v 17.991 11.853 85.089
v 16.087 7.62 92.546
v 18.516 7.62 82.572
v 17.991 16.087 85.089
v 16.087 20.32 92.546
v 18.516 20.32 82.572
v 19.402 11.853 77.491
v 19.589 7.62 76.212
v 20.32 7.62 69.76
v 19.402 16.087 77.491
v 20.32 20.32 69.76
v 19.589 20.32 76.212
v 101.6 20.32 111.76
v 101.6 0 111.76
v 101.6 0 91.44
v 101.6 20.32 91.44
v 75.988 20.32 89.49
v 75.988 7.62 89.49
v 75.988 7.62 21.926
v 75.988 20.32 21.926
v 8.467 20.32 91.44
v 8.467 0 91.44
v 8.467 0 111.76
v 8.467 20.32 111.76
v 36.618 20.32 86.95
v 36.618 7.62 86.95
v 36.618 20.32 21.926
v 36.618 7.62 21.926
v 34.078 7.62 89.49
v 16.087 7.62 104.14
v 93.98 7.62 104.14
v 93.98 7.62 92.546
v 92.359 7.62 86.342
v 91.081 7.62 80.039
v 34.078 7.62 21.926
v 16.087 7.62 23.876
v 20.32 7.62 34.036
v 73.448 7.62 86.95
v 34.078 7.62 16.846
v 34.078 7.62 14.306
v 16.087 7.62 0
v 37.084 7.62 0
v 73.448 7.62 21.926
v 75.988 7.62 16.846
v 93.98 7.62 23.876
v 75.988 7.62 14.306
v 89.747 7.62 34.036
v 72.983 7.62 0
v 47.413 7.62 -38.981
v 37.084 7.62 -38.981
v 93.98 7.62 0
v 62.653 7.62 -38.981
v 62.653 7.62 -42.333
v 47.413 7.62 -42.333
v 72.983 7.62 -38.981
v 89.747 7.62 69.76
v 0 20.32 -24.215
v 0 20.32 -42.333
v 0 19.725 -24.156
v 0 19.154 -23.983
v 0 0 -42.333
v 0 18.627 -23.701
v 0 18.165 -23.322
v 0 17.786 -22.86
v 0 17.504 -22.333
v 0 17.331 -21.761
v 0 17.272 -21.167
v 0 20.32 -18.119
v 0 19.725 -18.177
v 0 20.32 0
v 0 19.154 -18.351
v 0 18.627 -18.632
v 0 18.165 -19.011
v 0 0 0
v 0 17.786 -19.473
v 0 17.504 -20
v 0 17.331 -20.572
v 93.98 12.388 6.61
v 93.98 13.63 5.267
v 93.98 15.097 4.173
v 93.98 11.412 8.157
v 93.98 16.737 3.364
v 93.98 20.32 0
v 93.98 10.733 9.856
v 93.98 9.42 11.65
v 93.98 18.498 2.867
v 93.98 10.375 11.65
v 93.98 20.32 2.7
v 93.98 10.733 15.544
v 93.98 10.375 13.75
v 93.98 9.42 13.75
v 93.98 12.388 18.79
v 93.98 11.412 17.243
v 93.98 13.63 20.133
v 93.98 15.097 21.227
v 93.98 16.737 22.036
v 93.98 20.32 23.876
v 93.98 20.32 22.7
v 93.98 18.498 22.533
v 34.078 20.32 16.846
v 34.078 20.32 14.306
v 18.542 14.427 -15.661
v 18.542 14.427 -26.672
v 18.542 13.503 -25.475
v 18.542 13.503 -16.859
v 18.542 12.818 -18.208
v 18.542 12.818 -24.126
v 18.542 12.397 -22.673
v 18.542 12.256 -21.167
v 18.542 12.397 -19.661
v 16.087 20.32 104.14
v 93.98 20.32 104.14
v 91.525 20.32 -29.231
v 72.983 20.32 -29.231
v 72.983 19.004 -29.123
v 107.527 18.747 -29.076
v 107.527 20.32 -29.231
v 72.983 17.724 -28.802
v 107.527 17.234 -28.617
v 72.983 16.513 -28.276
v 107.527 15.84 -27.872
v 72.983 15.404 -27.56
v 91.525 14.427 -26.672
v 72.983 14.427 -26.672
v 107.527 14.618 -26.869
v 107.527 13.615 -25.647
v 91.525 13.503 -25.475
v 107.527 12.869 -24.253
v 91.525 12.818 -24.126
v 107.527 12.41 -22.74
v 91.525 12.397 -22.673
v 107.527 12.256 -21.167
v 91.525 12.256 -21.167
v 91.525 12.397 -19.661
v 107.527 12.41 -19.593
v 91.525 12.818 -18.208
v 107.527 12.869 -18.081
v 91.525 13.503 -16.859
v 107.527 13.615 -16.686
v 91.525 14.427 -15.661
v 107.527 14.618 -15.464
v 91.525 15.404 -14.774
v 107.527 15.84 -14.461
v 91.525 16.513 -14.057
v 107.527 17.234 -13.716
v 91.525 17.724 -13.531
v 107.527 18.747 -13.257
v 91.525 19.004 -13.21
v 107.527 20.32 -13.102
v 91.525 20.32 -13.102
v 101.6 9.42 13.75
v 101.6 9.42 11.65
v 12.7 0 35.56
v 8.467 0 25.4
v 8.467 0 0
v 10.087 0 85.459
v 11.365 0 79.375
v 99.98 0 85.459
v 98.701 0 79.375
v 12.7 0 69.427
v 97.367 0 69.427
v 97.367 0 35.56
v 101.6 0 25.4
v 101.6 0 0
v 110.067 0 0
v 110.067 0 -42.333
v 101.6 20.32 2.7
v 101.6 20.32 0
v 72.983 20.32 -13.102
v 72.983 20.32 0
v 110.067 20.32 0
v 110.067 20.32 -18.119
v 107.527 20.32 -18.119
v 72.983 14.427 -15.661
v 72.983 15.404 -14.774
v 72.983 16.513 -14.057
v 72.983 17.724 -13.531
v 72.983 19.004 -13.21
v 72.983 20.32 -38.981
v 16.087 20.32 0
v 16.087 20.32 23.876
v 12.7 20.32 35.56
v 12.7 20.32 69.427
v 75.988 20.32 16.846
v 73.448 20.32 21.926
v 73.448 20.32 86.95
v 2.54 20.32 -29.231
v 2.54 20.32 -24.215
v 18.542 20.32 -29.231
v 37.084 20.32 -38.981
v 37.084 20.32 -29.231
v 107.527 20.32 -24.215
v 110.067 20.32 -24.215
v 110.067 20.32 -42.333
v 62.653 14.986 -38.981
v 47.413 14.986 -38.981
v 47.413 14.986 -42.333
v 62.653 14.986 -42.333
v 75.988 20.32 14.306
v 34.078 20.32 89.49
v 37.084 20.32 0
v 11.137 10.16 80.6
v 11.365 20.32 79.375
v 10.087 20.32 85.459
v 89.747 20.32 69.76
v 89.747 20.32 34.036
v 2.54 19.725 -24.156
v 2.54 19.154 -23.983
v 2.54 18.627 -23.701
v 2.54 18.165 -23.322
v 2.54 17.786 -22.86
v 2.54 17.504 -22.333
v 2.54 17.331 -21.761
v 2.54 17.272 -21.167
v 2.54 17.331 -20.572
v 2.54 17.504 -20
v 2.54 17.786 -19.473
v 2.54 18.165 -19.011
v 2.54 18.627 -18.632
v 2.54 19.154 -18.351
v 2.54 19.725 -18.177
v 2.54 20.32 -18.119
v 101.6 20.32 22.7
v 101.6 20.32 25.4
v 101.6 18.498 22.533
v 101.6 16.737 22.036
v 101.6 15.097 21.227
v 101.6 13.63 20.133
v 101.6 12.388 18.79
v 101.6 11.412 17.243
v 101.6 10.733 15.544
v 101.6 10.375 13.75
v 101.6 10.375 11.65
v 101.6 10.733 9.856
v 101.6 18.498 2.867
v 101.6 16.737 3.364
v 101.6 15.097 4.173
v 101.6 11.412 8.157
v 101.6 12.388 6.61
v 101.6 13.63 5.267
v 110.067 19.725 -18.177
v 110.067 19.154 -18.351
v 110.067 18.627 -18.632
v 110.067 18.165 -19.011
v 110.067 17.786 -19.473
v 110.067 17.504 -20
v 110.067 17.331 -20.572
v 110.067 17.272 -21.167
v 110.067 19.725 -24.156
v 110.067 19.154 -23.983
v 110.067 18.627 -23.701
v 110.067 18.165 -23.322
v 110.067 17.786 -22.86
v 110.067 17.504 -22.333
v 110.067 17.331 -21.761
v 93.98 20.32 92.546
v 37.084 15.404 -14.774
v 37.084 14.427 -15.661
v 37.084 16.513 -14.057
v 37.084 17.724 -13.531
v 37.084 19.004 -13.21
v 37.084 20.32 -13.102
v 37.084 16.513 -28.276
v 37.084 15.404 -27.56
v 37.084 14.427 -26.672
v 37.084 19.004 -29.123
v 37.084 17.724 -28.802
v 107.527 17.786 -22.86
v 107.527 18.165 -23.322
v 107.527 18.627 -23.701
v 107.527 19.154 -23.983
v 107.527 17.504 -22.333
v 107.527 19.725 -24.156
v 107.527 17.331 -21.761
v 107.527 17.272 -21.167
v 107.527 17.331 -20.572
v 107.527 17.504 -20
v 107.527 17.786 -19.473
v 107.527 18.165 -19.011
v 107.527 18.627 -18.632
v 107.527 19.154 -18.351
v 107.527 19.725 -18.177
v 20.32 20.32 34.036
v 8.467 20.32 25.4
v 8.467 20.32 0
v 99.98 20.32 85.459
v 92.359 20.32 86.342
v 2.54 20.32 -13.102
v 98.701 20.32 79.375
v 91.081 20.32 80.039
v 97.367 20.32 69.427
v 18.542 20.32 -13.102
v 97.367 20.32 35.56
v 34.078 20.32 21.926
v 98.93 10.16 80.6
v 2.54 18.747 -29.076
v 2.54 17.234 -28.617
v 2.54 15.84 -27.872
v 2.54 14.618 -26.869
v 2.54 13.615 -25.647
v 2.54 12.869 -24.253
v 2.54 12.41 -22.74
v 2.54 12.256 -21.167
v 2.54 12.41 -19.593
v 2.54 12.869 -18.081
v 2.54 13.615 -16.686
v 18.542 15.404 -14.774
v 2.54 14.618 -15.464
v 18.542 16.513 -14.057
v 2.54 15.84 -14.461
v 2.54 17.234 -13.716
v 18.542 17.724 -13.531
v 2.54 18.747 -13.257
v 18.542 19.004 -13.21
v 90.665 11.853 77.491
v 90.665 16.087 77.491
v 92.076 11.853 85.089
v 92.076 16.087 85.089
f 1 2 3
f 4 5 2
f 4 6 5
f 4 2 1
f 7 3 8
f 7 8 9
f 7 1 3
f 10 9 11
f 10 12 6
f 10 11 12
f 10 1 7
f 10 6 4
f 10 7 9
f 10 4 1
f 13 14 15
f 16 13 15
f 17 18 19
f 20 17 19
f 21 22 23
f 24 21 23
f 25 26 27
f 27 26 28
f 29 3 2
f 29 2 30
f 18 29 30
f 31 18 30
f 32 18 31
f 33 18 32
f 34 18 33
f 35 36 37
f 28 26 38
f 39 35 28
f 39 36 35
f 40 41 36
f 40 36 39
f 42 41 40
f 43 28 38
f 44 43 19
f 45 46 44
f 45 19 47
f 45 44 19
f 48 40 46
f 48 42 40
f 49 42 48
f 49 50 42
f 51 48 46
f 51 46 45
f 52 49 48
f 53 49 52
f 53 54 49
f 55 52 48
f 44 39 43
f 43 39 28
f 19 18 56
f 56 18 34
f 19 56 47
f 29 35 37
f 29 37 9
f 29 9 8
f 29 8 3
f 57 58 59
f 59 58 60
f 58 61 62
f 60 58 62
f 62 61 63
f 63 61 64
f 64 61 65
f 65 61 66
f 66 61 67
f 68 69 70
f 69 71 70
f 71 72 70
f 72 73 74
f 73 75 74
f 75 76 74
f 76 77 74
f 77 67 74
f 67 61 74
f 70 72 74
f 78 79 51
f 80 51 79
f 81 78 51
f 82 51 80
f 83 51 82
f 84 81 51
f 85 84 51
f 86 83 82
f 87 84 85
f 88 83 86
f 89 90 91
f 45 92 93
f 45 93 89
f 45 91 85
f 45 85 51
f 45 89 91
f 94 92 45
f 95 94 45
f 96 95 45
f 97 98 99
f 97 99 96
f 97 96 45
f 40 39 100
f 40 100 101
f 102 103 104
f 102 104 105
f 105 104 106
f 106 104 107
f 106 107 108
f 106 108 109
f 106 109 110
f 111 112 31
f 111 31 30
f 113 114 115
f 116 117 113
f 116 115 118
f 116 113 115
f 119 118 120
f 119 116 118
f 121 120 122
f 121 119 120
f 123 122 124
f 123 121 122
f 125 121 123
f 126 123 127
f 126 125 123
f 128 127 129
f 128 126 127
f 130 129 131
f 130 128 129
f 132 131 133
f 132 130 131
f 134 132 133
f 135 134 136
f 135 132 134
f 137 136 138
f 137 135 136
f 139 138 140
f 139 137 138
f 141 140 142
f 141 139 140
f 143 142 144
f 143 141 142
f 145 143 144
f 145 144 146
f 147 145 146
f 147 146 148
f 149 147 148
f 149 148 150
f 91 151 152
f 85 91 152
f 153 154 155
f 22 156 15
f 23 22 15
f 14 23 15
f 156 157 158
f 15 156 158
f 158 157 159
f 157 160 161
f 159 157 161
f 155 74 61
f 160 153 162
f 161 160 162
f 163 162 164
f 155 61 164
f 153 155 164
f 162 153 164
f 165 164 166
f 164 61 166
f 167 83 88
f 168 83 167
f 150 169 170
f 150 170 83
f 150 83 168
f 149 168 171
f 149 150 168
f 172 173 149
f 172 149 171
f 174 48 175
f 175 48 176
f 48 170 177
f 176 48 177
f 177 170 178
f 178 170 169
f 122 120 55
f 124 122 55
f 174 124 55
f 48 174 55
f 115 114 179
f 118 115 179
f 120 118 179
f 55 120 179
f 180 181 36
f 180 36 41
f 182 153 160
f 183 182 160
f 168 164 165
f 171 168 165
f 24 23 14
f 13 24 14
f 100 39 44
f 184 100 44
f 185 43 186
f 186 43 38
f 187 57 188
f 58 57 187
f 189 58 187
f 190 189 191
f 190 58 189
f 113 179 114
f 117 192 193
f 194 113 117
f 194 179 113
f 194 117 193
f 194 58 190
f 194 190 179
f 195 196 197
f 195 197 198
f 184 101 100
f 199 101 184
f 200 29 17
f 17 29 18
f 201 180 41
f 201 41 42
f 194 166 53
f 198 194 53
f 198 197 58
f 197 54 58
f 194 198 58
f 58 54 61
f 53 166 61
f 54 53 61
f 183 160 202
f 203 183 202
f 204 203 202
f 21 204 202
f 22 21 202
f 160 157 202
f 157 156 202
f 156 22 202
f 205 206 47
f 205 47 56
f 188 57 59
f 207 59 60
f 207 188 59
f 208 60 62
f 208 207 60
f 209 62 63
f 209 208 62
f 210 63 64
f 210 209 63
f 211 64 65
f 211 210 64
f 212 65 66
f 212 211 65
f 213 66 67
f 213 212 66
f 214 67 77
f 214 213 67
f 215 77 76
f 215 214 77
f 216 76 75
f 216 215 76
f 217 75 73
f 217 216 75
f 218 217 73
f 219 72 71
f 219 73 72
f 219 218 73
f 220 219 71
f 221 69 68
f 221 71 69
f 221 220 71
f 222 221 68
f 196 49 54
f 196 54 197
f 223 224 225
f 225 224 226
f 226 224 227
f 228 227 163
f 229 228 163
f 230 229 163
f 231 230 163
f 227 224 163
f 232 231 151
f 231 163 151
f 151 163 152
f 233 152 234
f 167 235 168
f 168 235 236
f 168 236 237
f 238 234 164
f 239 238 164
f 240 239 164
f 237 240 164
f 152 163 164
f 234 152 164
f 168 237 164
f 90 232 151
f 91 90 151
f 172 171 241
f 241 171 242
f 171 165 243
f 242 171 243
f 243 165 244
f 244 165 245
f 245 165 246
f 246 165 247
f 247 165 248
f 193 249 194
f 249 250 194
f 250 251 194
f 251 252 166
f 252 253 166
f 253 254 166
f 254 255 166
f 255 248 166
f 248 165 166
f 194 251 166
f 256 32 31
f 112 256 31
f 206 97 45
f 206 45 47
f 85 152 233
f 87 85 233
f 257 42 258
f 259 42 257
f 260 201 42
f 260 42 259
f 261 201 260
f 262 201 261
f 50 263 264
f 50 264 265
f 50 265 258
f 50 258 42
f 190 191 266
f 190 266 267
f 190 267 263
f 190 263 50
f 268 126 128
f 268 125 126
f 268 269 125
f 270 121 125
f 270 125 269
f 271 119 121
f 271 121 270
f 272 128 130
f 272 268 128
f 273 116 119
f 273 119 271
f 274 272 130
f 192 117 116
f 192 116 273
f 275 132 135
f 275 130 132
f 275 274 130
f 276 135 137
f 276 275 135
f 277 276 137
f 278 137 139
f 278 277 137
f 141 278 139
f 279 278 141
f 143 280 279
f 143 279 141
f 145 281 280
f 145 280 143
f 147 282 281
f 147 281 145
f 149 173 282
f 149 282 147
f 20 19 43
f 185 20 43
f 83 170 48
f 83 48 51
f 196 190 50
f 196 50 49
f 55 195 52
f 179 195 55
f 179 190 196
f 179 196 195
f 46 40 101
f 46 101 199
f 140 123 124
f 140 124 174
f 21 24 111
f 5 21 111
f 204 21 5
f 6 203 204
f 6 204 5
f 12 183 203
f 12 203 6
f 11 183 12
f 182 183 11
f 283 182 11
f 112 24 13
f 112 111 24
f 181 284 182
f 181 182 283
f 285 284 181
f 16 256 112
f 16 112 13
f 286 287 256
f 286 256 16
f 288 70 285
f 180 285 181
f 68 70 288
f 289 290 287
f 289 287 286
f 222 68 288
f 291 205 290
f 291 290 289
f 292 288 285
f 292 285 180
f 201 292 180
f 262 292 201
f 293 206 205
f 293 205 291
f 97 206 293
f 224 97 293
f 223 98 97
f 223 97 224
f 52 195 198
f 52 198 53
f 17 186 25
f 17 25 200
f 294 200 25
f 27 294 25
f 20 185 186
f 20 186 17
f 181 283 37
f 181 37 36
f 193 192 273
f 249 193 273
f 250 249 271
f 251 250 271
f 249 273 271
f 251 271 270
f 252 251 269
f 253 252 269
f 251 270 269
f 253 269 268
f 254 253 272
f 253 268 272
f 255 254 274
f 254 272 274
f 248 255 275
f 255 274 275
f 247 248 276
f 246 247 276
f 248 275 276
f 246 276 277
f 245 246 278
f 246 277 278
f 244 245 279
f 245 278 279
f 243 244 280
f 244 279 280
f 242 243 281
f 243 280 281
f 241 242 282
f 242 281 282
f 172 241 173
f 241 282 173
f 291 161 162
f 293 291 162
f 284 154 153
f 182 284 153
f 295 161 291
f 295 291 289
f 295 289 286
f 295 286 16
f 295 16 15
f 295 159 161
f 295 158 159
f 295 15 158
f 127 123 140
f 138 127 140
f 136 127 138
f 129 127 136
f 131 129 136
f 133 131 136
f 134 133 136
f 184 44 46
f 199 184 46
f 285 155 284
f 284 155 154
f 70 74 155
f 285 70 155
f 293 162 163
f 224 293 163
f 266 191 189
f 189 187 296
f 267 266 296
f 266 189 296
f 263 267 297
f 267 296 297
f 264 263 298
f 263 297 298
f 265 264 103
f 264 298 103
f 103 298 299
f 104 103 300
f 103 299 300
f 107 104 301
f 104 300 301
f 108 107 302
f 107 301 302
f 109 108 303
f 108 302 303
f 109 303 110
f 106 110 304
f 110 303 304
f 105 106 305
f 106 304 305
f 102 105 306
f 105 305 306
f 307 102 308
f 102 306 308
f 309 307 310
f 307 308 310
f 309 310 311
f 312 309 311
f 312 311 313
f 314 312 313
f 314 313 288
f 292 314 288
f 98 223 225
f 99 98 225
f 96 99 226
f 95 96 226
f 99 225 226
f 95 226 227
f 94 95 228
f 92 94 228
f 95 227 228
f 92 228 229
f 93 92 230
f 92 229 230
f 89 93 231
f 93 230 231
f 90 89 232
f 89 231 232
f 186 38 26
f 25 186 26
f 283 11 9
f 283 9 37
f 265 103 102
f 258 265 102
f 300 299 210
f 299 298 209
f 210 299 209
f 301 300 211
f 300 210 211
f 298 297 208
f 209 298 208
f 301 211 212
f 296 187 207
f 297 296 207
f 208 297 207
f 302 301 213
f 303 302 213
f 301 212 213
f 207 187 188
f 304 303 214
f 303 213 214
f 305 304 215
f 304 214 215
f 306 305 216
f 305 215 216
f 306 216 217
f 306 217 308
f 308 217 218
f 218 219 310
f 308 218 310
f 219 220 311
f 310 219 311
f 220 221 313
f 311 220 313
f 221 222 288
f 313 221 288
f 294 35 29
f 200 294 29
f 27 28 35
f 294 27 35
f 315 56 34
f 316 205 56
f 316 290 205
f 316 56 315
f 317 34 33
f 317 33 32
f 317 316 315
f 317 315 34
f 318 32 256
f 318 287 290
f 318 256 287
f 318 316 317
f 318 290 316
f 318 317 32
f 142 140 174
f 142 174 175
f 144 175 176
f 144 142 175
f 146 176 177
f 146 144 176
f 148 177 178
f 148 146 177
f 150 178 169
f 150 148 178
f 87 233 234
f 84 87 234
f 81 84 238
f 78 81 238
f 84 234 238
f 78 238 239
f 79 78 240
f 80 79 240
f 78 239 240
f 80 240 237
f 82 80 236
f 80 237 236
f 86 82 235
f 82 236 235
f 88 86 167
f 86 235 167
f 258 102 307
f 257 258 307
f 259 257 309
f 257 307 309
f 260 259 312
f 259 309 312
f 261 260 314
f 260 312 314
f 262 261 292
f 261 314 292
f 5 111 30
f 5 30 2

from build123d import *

# Parameters (mm, degrees)
BOSS_EXTRUDE1_DEPTH = 20.32
CUT_EXTRUDE1_DEPTH  = 12.7
SKETCH14_R          = 8.0645
CUT_EXTRUDE4_DEPTH  = 16.002
CUT_EXTRUDE5_DEPTH  = 34.544
SKETCH14_5_R        = 3.048
CUT_EXTRUDE6_DEPTH  = 157.413445344
SKETCH15_W          = 35.898582
SKETCH15_H          = 38.980588406
CUT_EXTRUDE7_DEPTH  = 17.78
SKETCH16_W          = 41.91
SKETCH16_H          = 2.54
BOSS_EXTRUDE2_DEPTH = 12.7
CUT_EXTRUDE9_DEPTH  = 11.4
SKETCH17_5_R        = 10
CUT_EXTRUDE10_DEPTH = 11.4
CUT_EXTRUDE16_DEPTH = 10
SKETCH25_W          = 35.898582
SKETCH25_H          = 38.980588406
BOSS_EXTRUDE4_DEPTH = 5.08


with BuildPart() as part:
    # Sketch3 → Boss-Extrude1 (new body)
    with BuildSketch(Plane(origin=(0, 0, 0), x_dir=(1, 0, 0), z_dir=(0, 1, 0))):
        with BuildLine():
            Line((101.599873, 0), (110.066582, 0))
            Line((110.066582, 0), (110.066582, 42.333418))
            Line((110.066582, 42.333418), (55.033291, 42.333418))
            Line((55.033291, 42.333418), (8.4666328, 42.333418))
            Line((8.4666328, 42.333418), (0, 42.333418))
            Line((0, 42.333418), (0, 0))
            Line((0, 0), (8.4666328, 0))
            Line((8.4666328, 0), (8.4666328, -25.4))
            Line((8.4666328, -25.4), (12.6999492, -35.56))
            Line((12.6999492, -35.56), (12.6999492, -69.426582))
            add(Edge.make_bspline(
                [(12.6999492, -69.426582), (11.690404189, -80.766544706), (8.46666328, -91.44)],
                knots=[0, 0, 0, 0.504540069, 0.504540069, 0.504540069], degree=2))
            Line((8.46666328, -91.44), (8.46666328, -111.76))
            Line((8.46666328, -111.76), (101.599995682, -111.76))
            Line((101.599995682, -111.76), (101.599995682, -91.44))
            add(Edge.make_bspline(
                [(97.366709, -69.426582), (98.376270675, -80.766537876), (101.599995682, -91.44)],
                knots=[0, 0, 0, 0.504540407, 0.504540407, 0.504540407], degree=2))
            Line((97.366709, -69.426582), (97.366709, -35.56))
            Line((97.366709, -35.56), (101.599873, -25.4))
            Line((101.599873, -25.4), (101.599873, 0))
        make_face()
    extrude(amount=BOSS_EXTRUDE1_DEPTH)

    # Sketch7 → Cut-Extrude1 (cut)
    with BuildSketch(Plane(origin=(0, 20.32, 0), x_dir=(1, 0, 0), z_dir=(0, 1, 0))):
        with BuildLine():
            Line((16.0866328, 0), (93.979873, 0))
            Line((93.979873, 0), (93.979873, -23.876056271))
            Line((93.979873, -23.876056271), (89.746709, -34.036056271))
            Line((89.746709, -34.036056271), (89.746709, -69.759644388))
            add(Edge.make_bspline(
                [(89.746709, -69.759644388), (90.418698914, -77.556217584), (91.829471112, -85.161374913), (93.979995682, -92.545959033)],
                knots=[0, 0, 0, 0, 1, 1, 1, 1], degree=3))
            Line((93.979995682, -92.545959033), (93.979995682, -104.14))
            Line((93.979995682, -104.14), (16.08666328, -104.14))
            Line((16.08666328, -104.14), (16.08666328, -92.545964634))
            add(Edge.make_bspline(
                [(16.08666328, -92.545964634), (18.237198531, -85.161380775), (19.647970427, -77.556219246), (20.3199492, -69.759638641)],
                knots=[0, 0, 0, 0, 1, 1, 1, 1], degree=3))
            Line((20.3199492, -69.759638641), (20.3199492, -34.036005627))
            Line((20.3199492, -34.036005627), (16.0866328, -23.876005627))
            Line((16.0866328, -23.876005627), (16.0866328, 0))
        make_face()
    extrude(amount=-CUT_EXTRUDE1_DEPTH, mode=Mode.SUBTRACT)

    # Sketch14 → Cut-Extrude4 (cut)
    with BuildSketch(Plane.ZY.offset(-2.54)):
        with Locations((-21.166709, 20.32)):
            Circle(SKETCH14_R)
    cut_extrude4 = extrude(amount=-CUT_EXTRUDE4_DEPTH, mode=Mode.SUBTRACT)

    # Sketch14<4> → Cut-Extrude5 (cut)
    with BuildSketch(Plane.ZY.offset(-2.54)):
        with BuildLine():
            Line((-26.672257875, 14.4272), (-15.661160125, 14.4272))
            ThreePointArc((-15.661160125, 14.4272), (-21.166709, 28.3845), (-26.672257875, 14.4272))
        make_face()
    cut_extrude5 = extrude(amount=-CUT_EXTRUDE5_DEPTH, mode=Mode.SUBTRACT)

    # Sketch14<5> → Cut-Extrude6 (cut, through all)
    with BuildSketch(Plane.ZY.offset(-2.54)):
        with Locations((-21.166709, 20.32)):
            Circle(SKETCH14_5_R)
    cut_extrude6 = extrude(amount=CUT_EXTRUDE6_DEPTH, mode=Mode.SUBTRACT)

    # Mirror2: Cut-Extrude4, Cut-Extrude5, Cut-Extrude6 across plane
    add(cut_extrude4.mirror(Plane(origin=(55.033291, 0, 0), x_dir=(0, 0, 1), z_dir=(1, 0, 0))), mode=Mode.SUBTRACT)
    add(cut_extrude5.mirror(Plane(origin=(55.033291, 0, 0), x_dir=(0, 0, 1), z_dir=(1, 0, 0))), mode=Mode.SUBTRACT)
    add(cut_extrude6.mirror(Plane(origin=(55.033291, 0, 0), x_dir=(0, 0, 1), z_dir=(1, 0, 0))), mode=Mode.SUBTRACT)

    # Sketch15 → Cut-Extrude7 (cut)
    with BuildSketch(Plane(origin=(0, 20.32, 0), x_dir=(1, 0, 0), z_dir=(0, 1, 0))):
        with Locations((55.033291, 19.490294203)):
            Rectangle(SKETCH15_W, SKETCH15_H)
    extrude(amount=-CUT_EXTRUDE7_DEPTH, mode=Mode.SUBTRACT)

    # Sketch16 → Boss-Extrude2 (add)
    with BuildSketch(Plane(origin=(0, 7.62, 0), x_dir=(1, 0, 0), z_dir=(0, 1, 0))):
        with Locations((55.0333291, -15.57585033)):
            Rectangle(SKETCH16_W, SKETCH16_H)
        Polygon((75.9883291, -21.92585033), (73.4483291, -21.92585033), (73.4483291, -86.94985033), (36.6183291, -86.94985033), (36.6183291, -21.92585033), (34.0783291, -21.92585033), (34.0783291, -89.48985033), (75.9883291, -89.48985033), align=None)
    extrude(amount=BOSS_EXTRUDE2_DEPTH)

    # Sketch17 → Cut-Extrude9 (cut)
    with BuildSketch(Plane(origin=(104.139873, 0, 0), x_dir=(0, 0, -1), z_dir=(1, 0, 0))):
        with BuildLine():
            Line((-13.75, 9.42), (-12.7, 9.42))
            Line((-12.7, 9.42), (-11.65, 9.42))
            Line((-11.65, 9.42), (-11.65, 10.375277782))
            ThreePointArc((-11.65, 10.375277782), (-12.7, 10.32), (-13.75, 10.375277782))
            Line((-13.75, 10.375277782), (-13.75, 9.42))
        make_face()
    extrude(amount=-CUT_EXTRUDE9_DEPTH, mode=Mode.SUBTRACT)

    # Sketch17<5> → Cut-Extrude10 (cut)
    with BuildSketch(Plane(origin=(104.139873, 0, 0), x_dir=(0, 0, -1), z_dir=(1, 0, 0))):
        with Locations((-12.7, 20.32)):
            Circle(SKETCH17_5_R)
    extrude(amount=-CUT_EXTRUDE10_DEPTH, mode=Mode.SUBTRACT)

    # Sketch23 → Cut-Extrude16 (cut)
    with BuildSketch(Plane.XY.offset(-38.980588406)):
        Polygon((62.653291, 14.986), (62.653291, 7.62), (55.033291, 7.62), (47.413291, 7.62), (47.413291, 14.986), align=None)
    extrude(amount=-CUT_EXTRUDE16_DEPTH, mode=Mode.SUBTRACT)

    # Sketch25 → Boss-Extrude4 (add)
    with BuildSketch(Plane(origin=(0, 2.54, 0), x_dir=(1, 0, 0), z_dir=(0, 1, 0))):
        with Locations((55.033291, 19.490294203)):
            Rectangle(SKETCH25_W, SKETCH25_H)
    extrude(amount=BOSS_EXTRUDE4_DEPTH)


solid = part.part
